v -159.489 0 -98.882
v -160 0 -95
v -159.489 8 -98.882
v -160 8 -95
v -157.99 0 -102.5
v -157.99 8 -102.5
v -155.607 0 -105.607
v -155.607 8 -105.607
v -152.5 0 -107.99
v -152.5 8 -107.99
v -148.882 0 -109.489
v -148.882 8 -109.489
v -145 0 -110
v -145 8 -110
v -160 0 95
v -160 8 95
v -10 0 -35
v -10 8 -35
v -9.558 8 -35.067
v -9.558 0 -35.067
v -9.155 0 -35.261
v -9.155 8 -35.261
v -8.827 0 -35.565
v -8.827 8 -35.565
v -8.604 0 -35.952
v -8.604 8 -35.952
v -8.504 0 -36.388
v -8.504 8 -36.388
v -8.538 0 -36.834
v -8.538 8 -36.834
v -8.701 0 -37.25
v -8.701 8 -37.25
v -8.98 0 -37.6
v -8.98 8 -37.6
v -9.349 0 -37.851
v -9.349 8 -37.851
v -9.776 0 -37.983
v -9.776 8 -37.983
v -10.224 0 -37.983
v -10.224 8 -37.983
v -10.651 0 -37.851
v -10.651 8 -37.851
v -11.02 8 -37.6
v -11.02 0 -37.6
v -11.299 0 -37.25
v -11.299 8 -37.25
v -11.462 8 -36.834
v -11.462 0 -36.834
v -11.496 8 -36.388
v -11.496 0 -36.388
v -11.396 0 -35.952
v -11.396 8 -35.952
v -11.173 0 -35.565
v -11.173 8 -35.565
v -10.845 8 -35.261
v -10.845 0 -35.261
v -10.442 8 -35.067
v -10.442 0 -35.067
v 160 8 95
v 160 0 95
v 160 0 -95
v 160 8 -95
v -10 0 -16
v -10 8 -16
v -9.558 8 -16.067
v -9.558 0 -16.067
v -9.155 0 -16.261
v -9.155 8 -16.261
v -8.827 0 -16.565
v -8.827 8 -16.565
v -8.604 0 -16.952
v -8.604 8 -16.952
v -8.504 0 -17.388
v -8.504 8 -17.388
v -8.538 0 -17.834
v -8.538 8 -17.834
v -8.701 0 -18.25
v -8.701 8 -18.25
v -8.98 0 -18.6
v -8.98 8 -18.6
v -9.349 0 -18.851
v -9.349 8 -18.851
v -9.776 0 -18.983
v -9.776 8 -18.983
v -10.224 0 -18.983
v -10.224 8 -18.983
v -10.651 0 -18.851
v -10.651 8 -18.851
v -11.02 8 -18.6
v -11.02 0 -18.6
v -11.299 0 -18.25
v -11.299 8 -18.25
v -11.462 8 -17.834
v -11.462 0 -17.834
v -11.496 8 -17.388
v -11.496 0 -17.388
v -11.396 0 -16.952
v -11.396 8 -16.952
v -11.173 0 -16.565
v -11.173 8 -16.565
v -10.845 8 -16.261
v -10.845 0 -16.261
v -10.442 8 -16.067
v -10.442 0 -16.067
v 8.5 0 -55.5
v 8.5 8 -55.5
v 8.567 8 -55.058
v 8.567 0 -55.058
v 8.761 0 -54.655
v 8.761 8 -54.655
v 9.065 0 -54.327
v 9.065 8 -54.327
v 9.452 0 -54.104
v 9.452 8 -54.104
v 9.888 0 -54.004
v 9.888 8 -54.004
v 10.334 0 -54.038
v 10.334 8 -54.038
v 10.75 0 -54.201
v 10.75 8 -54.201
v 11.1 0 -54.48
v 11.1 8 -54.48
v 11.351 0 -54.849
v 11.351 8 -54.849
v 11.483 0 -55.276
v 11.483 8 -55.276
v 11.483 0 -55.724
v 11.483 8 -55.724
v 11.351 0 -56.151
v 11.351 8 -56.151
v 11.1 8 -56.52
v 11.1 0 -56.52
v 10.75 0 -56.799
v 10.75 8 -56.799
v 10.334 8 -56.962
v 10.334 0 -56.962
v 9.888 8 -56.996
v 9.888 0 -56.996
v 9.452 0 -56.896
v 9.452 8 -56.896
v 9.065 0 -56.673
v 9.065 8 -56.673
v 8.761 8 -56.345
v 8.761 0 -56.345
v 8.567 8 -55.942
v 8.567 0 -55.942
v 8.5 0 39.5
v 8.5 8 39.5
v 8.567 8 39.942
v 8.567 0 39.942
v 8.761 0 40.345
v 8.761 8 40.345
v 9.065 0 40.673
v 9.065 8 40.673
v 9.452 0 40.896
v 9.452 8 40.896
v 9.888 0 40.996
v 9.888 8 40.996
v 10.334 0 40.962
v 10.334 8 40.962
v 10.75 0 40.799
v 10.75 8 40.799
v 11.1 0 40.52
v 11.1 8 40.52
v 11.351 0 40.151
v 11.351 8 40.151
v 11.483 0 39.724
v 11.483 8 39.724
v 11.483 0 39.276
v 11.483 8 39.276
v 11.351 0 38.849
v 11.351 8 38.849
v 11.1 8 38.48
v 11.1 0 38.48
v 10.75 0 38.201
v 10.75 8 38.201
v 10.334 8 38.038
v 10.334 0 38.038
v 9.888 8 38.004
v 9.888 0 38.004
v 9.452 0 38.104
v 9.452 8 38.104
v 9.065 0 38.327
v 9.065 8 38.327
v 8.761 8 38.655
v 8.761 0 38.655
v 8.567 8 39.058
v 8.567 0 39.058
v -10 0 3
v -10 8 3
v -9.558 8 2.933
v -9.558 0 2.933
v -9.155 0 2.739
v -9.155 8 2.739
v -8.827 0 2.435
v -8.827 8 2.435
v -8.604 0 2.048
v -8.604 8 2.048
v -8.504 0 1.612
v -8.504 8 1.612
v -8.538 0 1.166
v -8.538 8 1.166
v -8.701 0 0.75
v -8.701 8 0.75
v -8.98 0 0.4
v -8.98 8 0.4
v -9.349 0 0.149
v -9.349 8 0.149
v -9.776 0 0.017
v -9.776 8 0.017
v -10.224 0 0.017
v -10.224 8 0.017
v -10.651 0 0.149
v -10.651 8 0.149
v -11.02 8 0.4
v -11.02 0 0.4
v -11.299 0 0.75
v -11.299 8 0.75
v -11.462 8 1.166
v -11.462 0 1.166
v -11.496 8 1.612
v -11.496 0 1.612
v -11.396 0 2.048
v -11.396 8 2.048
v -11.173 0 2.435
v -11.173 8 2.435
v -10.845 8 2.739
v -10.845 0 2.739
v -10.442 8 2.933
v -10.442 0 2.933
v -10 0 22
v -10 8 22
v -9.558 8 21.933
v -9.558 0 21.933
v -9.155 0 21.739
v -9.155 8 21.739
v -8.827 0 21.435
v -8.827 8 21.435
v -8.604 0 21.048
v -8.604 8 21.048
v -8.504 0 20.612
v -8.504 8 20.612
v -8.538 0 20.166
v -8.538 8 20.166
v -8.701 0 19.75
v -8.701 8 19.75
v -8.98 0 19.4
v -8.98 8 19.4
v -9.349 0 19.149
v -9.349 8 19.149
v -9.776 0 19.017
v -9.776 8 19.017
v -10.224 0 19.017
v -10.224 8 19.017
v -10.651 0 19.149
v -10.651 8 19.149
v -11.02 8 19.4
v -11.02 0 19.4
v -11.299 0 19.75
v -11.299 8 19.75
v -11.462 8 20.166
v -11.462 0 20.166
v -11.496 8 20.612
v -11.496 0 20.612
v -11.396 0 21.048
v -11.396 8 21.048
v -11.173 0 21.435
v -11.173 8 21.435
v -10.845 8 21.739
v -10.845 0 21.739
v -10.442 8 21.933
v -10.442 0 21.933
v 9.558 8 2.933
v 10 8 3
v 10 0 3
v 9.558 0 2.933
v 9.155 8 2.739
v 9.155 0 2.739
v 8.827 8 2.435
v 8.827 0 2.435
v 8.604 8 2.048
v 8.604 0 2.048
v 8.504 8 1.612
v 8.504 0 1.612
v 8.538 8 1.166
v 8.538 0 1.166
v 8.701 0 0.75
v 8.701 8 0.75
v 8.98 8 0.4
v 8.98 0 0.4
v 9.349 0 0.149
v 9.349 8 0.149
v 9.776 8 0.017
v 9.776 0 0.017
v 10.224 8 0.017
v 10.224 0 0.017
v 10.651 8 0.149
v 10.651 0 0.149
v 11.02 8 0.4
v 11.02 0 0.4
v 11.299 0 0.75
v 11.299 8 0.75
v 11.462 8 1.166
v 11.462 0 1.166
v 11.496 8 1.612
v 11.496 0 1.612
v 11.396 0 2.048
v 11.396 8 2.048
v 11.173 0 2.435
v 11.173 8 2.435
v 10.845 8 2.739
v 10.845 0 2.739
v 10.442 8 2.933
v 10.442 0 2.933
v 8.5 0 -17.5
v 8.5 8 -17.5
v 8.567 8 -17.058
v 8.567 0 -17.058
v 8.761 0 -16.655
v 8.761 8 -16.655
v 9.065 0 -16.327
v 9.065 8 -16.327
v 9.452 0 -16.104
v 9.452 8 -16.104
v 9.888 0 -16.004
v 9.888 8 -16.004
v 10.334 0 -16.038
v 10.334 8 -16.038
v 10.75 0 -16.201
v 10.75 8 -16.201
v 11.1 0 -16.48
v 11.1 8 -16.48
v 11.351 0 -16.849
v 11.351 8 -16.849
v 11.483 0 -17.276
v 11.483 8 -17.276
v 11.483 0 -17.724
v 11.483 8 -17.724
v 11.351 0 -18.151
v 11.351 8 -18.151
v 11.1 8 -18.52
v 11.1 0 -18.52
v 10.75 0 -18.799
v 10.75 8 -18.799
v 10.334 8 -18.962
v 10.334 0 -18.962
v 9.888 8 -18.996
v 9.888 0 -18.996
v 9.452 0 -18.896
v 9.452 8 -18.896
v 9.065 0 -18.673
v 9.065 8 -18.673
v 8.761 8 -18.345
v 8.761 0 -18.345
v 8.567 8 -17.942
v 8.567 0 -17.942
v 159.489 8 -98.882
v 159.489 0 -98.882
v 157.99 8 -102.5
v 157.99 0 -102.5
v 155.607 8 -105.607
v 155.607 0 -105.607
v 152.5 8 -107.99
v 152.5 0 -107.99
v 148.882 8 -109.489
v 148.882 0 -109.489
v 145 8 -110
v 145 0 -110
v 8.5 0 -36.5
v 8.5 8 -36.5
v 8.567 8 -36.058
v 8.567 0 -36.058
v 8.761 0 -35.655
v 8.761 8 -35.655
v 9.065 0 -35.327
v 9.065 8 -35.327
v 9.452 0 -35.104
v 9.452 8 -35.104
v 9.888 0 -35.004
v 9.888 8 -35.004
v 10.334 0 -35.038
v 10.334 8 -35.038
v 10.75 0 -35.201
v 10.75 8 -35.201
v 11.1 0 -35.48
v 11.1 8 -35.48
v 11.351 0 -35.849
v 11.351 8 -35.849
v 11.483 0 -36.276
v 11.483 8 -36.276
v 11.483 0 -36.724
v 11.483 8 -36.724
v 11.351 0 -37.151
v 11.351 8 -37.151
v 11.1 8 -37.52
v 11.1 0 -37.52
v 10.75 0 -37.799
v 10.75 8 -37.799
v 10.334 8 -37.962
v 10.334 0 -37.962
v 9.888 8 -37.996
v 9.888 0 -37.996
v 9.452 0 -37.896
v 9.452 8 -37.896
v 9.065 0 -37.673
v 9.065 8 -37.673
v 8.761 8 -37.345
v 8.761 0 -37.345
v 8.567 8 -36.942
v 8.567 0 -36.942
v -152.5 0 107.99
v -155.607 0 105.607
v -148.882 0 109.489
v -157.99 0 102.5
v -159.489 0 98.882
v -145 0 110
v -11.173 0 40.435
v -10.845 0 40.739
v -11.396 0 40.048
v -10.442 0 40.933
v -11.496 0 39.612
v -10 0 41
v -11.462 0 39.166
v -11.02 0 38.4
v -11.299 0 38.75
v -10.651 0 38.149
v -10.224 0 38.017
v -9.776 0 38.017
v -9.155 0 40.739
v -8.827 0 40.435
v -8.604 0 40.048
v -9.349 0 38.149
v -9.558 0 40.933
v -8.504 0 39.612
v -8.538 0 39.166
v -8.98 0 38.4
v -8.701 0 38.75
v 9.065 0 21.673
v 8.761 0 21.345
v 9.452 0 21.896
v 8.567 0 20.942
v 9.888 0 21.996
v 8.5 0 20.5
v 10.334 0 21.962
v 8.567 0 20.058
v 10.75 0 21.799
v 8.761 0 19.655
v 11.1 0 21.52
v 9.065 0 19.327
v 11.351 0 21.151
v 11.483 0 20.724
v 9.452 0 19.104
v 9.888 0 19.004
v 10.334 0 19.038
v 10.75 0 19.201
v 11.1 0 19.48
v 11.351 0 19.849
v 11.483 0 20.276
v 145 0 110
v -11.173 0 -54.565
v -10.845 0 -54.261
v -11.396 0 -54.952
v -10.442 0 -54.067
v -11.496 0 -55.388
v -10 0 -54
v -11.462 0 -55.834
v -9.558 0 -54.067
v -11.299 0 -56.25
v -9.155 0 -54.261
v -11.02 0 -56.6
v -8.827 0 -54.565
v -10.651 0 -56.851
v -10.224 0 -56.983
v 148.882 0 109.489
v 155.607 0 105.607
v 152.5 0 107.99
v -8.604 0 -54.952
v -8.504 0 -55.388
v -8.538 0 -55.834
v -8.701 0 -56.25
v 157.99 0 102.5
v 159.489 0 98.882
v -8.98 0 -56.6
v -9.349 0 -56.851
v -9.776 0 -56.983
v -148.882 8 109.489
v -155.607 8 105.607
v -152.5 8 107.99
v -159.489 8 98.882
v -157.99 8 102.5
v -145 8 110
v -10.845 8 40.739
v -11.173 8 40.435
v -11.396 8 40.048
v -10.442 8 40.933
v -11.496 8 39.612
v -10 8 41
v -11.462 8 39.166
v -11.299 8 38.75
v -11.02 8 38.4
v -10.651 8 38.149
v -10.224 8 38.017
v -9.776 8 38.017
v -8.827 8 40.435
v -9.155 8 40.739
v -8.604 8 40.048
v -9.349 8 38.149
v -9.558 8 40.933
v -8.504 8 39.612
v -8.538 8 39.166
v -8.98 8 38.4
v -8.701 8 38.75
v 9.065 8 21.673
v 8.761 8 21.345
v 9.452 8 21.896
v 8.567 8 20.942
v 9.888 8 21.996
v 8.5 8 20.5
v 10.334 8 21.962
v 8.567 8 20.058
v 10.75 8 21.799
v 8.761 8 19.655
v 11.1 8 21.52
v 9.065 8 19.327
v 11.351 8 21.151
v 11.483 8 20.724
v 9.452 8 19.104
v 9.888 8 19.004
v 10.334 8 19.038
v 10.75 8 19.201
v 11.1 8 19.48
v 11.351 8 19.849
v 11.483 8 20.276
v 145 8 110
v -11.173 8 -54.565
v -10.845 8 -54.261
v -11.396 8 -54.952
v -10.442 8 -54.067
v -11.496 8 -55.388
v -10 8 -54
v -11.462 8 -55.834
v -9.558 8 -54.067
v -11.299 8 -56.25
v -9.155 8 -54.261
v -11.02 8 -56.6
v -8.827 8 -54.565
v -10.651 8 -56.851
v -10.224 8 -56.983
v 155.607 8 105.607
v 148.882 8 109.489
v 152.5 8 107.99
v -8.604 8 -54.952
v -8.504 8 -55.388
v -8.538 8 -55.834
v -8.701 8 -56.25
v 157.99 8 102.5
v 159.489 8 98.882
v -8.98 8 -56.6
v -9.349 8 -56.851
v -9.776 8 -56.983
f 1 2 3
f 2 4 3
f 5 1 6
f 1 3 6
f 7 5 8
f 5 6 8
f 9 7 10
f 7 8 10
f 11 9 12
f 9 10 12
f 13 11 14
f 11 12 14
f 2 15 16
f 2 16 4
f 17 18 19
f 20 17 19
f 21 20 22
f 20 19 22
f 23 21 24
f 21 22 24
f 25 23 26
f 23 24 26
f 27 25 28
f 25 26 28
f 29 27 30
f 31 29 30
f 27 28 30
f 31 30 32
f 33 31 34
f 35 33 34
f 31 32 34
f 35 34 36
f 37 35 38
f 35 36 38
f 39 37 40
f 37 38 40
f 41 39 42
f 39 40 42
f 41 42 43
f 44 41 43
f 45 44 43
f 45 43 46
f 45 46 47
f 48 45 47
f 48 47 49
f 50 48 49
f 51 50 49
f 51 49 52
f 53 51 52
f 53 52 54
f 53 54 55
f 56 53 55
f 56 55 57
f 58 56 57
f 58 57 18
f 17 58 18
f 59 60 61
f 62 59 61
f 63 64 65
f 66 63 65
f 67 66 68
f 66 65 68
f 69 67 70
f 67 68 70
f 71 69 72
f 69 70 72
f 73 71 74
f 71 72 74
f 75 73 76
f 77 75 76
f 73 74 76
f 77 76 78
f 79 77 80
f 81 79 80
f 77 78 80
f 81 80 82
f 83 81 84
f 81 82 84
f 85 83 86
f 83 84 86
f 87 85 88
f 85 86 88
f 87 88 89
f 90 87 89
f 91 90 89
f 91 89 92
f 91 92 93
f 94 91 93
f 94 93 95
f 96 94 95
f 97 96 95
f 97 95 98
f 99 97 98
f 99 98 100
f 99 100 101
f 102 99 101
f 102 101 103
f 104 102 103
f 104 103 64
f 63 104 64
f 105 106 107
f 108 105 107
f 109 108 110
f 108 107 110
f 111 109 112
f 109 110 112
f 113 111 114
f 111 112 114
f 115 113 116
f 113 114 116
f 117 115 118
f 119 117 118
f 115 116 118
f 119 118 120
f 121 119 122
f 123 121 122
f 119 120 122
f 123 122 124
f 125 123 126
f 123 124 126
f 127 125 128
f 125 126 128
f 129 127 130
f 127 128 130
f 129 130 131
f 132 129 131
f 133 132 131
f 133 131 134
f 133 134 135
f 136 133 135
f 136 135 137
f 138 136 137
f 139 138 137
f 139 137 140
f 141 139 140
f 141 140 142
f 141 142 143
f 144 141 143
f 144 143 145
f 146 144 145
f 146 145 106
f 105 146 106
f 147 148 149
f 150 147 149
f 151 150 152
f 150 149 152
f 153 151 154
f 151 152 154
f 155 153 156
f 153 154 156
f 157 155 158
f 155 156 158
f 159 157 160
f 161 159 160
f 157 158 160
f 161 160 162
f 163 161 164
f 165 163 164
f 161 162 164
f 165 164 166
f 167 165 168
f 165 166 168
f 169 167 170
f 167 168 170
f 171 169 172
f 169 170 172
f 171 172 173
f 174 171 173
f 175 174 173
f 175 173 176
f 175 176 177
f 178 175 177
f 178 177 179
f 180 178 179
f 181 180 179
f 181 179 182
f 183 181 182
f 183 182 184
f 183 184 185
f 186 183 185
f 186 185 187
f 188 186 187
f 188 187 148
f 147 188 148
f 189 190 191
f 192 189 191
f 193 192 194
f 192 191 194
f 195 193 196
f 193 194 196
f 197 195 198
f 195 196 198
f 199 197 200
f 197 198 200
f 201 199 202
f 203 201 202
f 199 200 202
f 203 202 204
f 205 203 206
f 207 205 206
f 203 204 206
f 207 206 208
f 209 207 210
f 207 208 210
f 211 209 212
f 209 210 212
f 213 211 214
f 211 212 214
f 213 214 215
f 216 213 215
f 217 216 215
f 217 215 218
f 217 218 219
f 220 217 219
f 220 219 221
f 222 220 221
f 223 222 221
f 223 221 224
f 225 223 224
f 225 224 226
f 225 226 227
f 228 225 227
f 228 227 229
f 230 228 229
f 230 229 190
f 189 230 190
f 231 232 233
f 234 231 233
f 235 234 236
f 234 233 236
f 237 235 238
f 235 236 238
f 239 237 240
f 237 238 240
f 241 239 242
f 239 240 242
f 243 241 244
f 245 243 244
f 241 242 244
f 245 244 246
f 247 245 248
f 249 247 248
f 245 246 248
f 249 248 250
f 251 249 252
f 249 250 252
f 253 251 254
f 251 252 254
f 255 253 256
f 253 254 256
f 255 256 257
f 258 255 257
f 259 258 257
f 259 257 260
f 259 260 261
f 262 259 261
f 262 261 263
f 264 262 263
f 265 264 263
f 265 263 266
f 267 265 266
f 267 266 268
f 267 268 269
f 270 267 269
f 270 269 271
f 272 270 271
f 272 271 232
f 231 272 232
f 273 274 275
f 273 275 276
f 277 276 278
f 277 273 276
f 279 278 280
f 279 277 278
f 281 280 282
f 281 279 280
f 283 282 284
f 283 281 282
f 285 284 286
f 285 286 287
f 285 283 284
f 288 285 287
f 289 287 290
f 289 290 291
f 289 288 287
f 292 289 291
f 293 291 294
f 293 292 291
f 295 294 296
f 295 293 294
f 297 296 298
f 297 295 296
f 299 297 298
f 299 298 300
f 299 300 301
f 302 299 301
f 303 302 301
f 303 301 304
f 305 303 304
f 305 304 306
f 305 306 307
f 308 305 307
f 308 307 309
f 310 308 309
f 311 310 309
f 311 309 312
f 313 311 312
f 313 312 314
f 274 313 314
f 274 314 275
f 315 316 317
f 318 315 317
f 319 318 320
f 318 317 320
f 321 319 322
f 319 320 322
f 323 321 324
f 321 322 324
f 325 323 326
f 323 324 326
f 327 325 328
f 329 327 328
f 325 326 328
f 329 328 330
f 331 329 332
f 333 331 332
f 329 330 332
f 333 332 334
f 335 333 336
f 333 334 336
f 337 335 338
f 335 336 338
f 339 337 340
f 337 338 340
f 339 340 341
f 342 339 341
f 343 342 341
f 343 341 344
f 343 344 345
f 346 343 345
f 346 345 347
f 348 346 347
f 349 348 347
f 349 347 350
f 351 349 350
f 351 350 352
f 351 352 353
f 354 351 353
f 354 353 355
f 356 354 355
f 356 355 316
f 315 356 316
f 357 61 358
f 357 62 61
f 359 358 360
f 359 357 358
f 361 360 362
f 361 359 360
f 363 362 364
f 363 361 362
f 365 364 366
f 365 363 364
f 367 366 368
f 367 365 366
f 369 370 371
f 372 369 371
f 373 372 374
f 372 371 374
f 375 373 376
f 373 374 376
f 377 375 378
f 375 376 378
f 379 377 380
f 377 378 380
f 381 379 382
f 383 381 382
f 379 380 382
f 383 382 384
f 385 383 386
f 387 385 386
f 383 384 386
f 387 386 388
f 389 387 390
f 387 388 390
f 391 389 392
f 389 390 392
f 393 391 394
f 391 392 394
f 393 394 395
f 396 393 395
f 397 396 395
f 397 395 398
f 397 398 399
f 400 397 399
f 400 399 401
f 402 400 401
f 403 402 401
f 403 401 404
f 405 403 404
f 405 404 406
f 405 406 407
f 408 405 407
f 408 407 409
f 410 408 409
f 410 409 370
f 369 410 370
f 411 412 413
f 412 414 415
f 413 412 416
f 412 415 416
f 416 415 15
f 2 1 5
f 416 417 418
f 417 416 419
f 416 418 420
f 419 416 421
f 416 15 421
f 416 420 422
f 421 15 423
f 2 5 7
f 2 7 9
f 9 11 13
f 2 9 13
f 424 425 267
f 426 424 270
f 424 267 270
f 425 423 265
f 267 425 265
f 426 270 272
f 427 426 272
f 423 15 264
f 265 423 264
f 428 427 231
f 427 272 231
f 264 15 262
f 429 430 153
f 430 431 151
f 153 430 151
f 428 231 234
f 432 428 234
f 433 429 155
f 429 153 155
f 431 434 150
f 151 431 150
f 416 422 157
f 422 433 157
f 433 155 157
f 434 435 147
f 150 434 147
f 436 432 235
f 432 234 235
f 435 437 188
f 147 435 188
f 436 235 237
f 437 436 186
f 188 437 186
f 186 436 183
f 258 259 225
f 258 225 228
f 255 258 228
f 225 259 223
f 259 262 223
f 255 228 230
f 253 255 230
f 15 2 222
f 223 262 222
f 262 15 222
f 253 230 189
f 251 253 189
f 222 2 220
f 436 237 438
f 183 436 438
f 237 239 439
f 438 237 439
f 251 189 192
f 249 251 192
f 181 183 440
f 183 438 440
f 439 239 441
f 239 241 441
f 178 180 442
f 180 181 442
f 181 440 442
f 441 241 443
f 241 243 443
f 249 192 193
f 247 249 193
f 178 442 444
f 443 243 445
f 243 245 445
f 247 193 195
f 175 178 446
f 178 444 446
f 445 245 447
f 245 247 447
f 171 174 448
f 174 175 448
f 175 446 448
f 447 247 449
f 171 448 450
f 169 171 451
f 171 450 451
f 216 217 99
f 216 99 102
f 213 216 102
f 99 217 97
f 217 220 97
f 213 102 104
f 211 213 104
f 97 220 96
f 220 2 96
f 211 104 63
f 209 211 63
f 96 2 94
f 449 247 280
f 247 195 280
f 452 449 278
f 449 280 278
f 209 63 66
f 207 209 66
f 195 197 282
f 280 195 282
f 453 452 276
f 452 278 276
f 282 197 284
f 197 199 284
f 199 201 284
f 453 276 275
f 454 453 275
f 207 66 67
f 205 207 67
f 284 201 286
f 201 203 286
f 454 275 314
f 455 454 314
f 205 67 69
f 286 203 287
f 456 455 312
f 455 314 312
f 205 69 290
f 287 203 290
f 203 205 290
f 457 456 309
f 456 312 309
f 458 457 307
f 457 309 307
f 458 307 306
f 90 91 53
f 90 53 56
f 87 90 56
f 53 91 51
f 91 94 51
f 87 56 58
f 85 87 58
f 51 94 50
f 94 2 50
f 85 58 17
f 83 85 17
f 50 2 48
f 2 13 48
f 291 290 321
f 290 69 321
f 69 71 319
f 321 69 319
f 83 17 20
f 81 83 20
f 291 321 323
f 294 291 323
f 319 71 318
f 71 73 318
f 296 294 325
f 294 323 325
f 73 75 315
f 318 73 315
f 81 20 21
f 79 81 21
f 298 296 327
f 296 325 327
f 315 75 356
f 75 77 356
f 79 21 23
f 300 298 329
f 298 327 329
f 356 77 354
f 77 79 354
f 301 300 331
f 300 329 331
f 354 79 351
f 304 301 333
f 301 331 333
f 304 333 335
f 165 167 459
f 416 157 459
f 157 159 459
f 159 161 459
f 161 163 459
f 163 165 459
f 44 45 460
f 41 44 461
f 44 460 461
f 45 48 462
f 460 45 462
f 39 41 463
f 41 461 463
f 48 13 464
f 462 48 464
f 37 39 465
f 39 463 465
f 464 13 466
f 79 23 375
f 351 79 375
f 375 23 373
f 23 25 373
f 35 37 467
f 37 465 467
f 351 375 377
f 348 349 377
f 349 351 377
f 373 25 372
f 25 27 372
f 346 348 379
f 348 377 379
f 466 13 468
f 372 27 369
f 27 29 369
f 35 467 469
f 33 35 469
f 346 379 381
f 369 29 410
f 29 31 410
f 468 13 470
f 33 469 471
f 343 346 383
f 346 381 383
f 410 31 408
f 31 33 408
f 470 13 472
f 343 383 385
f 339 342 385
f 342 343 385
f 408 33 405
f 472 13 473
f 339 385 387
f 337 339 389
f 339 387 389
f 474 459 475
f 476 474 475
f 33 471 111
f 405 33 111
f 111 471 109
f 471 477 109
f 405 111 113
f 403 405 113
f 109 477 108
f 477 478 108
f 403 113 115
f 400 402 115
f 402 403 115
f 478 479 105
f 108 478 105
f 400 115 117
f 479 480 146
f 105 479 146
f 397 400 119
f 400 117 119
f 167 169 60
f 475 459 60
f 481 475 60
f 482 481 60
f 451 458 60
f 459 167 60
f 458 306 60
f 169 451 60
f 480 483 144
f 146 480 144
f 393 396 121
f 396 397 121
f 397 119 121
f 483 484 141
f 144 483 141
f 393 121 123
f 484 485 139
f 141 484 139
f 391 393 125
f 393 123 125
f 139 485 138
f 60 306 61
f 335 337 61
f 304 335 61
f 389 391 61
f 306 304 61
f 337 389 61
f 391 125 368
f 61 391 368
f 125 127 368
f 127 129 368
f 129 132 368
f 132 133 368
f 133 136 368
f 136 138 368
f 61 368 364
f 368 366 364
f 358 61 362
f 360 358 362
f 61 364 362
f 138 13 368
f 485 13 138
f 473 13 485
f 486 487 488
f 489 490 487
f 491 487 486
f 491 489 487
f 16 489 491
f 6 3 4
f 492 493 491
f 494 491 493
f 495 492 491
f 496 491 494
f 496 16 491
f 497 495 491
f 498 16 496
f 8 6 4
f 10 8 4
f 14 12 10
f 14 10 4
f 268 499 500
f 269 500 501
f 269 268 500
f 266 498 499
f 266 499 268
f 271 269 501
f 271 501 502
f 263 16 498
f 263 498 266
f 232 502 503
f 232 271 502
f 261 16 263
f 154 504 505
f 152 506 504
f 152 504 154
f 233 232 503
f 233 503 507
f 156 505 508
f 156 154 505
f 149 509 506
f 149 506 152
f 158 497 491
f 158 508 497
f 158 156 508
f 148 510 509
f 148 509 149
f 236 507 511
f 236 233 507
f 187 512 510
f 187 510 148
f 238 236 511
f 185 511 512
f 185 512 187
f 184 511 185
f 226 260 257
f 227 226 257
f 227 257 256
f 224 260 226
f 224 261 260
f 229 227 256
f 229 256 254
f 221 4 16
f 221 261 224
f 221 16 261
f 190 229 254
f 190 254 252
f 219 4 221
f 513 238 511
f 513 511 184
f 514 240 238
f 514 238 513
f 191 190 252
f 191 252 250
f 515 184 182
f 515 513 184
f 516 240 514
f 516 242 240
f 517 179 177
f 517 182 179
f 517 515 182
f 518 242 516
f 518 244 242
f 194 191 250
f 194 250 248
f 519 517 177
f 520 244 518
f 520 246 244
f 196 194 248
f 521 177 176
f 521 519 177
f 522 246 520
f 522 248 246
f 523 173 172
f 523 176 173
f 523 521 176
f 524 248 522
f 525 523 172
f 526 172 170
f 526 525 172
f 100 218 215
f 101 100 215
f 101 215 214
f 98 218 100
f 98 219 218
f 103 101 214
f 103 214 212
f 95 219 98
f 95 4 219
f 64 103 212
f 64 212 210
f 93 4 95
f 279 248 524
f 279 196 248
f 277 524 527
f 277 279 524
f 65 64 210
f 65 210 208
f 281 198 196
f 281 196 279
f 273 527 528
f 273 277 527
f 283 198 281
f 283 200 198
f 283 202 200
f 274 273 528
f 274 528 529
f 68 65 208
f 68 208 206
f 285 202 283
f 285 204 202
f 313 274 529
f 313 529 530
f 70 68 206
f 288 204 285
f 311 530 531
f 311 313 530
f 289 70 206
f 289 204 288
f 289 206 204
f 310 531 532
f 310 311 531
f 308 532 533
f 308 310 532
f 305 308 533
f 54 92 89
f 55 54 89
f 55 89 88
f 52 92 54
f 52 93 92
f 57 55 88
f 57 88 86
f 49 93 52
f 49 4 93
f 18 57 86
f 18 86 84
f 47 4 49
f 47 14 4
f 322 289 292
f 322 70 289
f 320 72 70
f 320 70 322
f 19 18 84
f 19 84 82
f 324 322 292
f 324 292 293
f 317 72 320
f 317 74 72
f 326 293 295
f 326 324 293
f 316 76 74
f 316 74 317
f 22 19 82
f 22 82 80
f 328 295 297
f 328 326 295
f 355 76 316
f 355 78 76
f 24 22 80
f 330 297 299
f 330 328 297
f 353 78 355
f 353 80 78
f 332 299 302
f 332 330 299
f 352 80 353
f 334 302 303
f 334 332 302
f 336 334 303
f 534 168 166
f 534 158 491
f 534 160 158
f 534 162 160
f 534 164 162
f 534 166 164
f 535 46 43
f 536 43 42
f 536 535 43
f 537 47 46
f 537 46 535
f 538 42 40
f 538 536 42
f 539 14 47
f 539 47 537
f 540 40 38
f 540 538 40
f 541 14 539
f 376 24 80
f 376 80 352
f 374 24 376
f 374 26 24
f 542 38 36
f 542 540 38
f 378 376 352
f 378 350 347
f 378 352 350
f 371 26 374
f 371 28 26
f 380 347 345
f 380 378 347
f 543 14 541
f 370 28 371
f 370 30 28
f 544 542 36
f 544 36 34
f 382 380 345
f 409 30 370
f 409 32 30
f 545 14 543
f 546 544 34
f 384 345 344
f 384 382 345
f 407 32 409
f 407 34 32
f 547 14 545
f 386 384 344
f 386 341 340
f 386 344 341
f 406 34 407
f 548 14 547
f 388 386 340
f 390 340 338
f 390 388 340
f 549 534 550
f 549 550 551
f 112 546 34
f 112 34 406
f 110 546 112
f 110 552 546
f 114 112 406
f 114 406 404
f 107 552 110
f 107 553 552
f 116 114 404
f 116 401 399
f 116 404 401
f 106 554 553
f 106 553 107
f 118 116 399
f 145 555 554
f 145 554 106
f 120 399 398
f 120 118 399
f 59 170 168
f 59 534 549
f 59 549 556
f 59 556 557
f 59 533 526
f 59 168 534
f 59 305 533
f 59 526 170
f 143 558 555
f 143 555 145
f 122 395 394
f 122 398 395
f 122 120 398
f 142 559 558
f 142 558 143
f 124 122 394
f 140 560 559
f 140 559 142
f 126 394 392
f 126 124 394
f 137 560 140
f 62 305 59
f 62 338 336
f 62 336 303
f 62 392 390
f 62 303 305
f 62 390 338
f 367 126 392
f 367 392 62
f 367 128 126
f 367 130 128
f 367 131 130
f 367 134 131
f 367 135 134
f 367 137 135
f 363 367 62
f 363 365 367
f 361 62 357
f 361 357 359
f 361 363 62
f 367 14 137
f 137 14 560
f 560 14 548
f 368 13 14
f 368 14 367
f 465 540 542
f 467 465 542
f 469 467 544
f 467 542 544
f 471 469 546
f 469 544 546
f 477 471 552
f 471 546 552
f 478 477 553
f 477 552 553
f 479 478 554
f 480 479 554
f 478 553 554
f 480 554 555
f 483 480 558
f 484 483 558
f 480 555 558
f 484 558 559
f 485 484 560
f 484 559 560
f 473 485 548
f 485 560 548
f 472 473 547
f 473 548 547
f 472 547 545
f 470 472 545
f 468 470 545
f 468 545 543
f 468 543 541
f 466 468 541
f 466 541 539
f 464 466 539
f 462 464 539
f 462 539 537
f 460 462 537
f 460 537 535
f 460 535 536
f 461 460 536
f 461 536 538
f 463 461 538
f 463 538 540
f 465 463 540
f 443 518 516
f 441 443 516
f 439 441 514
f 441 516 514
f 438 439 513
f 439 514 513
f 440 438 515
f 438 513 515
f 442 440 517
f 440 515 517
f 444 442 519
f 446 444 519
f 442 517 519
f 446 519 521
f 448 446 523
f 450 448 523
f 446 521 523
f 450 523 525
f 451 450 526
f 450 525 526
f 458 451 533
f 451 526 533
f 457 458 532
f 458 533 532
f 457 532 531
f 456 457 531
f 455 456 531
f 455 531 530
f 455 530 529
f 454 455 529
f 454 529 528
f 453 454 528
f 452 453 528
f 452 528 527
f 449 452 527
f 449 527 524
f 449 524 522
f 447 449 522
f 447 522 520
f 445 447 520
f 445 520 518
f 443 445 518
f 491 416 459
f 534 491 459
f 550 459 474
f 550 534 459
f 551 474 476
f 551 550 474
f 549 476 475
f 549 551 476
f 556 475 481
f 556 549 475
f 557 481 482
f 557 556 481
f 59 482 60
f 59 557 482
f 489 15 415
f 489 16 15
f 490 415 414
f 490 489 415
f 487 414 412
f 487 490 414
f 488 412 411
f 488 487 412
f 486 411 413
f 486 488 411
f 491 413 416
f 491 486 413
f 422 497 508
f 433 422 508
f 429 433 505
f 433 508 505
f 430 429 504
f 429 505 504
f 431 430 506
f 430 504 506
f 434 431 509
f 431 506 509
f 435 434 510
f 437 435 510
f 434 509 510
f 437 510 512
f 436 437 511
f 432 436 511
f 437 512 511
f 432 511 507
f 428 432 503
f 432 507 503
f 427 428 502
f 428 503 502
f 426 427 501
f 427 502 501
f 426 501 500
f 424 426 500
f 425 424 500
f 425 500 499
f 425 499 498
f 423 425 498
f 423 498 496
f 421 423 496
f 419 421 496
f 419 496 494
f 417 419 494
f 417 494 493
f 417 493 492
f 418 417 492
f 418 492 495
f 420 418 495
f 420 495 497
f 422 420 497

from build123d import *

# Parameters (mm, degrees)
SKETCH1_W               = 320
SKETCH1_H               = 220
BOSS_EXTRUDE1_DEPTH     = 8
FILLET1_R               = 15
CUT_EXTRUDE2_REACH      = 196.33
SKETCH3_R               = 1.5
LPATTERN2_COUNT         = 4
LPATTERN2_PITCH         = 19
LPATTERN2_COL_COUNT     = 3
LPATTERN2_COL_PITCH     = 19
MIRROR2_COPY_1_REACH    = 196.33
MIRROR2_COPY_1_SKETCH_R = 1.5
MIRROR2_COPY_2_REACH    = 196.33
MIRROR2_COPY_2_SKETCH_R = 1.5
MIRROR2_COPY_3_REACH    = 196.33
MIRROR2_COPY_3_SKETCH_R = 1.5
MIRROR2_COPY_4_REACH    = 196.33
MIRROR2_COPY_4_SKETCH_R = 1.5
MIRROR2_COPY_5_REACH    = 196.33
MIRROR2_COPY_5_SKETCH_R = 1.5


with BuildPart() as part:
    # Sketch1 → Boss-Extrude1 (new body)
    with BuildSketch(Plane(origin=(0, 0, 0), x_dir=(1, 0, 0), z_dir=(0, 1, 0))):
        Rectangle(SKETCH1_W, SKETCH1_H)
    extrude(amount=BOSS_EXTRUDE1_DEPTH)

    # Fillet1
    fillet1_edges = [part.edges().sort_by_distance(p)[0] for p in [
        (-160, 4, -110),
        (160, 4, -110),
        (160, 4, 110),
        (-160, 4, 110),
    ]]
    fillet(fillet1_edges, radius=FILLET1_R)

    # Sketch3 → Cut-Extrude2 (cut, up to next)
    with BuildSketch(Plane(origin=(0, 8, 0), x_dir=(1, 0, 0), z_dir=(0, 1, 0)), mode=Mode.PRIVATE) as cut_extrude2_sk1:
        with Locations(Location((-10, -1.5, 0), (0, 0, 270))):
            Circle(SKETCH3_R)
    cut_extrude2_tool1 = extrude(cut_extrude2_sk1.sketch, amount=-CUT_EXTRUDE2_REACH, mode=Mode.PRIVATE) & part.part
    cut_extrude2 = cut_extrude2_tool1.solids().sort_by_distance((-10, 8, 1.5))[0]
    add(cut_extrude2, mode=Mode.SUBTRACT)

    # LPattern2: Cut-Extrude2 ×4
    with Locations(*[(0, 0, -i * LPATTERN2_PITCH) for i in range(1, LPATTERN2_COUNT)]):
        add(cut_extrude2, mode=Mode.SUBTRACT)

    # LPattern2 col: Cut-Extrude2 ×3
    with Locations(*[(0, 0, i * LPATTERN2_COL_PITCH) for i in range(1, LPATTERN2_COL_COUNT)]):
        add(cut_extrude2, mode=Mode.SUBTRACT)

    # Mirror2: Cut-Extrude2 across plane
    add(cut_extrude2.mirror(Plane(origin=(0, 0, 0), x_dir=(0, 0, 1), z_dir=(1, 0, 0))), mode=Mode.SUBTRACT)

    # Mirror2 copy 1 sketch → Mirror2 copy 1 (cut, up to next)
    with BuildSketch(Plane(origin=(0, 8, -19), x_dir=(-1, 0, 0), z_dir=(0, 1, 0)), mode=Mode.PRIVATE) as mirror2_copy_1_sk1:
        with Locations((-10, 1.5)):
            Circle(MIRROR2_COPY_1_SKETCH_R)
    mirror2_copy_1_tool1 = extrude(mirror2_copy_1_sk1.sketch, amount=-MIRROR2_COPY_1_REACH, mode=Mode.PRIVATE) & part.part
    add(mirror2_copy_1_tool1.solids().sort_by_distance((10, 8, -17.5))[0], mode=Mode.SUBTRACT)

    # Mirror2 copy 2 sketch → Mirror2 copy 2 (cut, up to next)
    with BuildSketch(Plane(origin=(0, 8, -38), x_dir=(-1, 0, 0), z_dir=(0, 1, 0)), mode=Mode.PRIVATE) as mirror2_copy_2_sk1:
        with Locations((-10, 1.5)):
            Circle(MIRROR2_COPY_2_SKETCH_R)
    mirror2_copy_2_tool1 = extrude(mirror2_copy_2_sk1.sketch, amount=-MIRROR2_COPY_2_REACH, mode=Mode.PRIVATE) & part.part
    add(mirror2_copy_2_tool1.solids().sort_by_distance((10, 8, -36.5))[0], mode=Mode.SUBTRACT)

    # Mirror2 copy 3 sketch → Mirror2 copy 3 (cut, up to next)
    with BuildSketch(Plane(origin=(0, 8, -57), x_dir=(-1, 0, 0), z_dir=(0, 1, 0)), mode=Mode.PRIVATE) as mirror2_copy_3_sk1:
        with Locations((-10, 1.5)):
            Circle(MIRROR2_COPY_3_SKETCH_R)
    mirror2_copy_3_tool1 = extrude(mirror2_copy_3_sk1.sketch, amount=-MIRROR2_COPY_3_REACH, mode=Mode.PRIVATE) & part.part
    add(mirror2_copy_3_tool1.solids().sort_by_distance((10, 8, -55.5))[0], mode=Mode.SUBTRACT)

    # Mirror2 copy 4 sketch → Mirror2 copy 4 (cut, up to next)
    with BuildSketch(Plane(origin=(0, 8, 19), x_dir=(-1, 0, 0), z_dir=(0, 1, 0)), mode=Mode.PRIVATE) as mirror2_copy_4_sk1:
        with Locations((-10, 1.5)):
            Circle(MIRROR2_COPY_4_SKETCH_R)
    mirror2_copy_4_tool1 = extrude(mirror2_copy_4_sk1.sketch, amount=-MIRROR2_COPY_4_REACH, mode=Mode.PRIVATE) & part.part
    add(mirror2_copy_4_tool1.solids().sort_by_distance((10, 8, 20.5))[0], mode=Mode.SUBTRACT)

    # Mirror2 copy 5 sketch → Mirror2 copy 5 (cut, up to next)
    with BuildSketch(Plane(origin=(0, 8, 38), x_dir=(-1, 0, 0), z_dir=(0, 1, 0)), mode=Mode.PRIVATE) as mirror2_copy_5_sk1:
        with Locations((-10, 1.5)):
            Circle(MIRROR2_COPY_5_SKETCH_R)
    mirror2_copy_5_tool1 = extrude(mirror2_copy_5_sk1.sketch, amount=-MIRROR2_COPY_5_REACH, mode=Mode.PRIVATE) & part.part
    add(mirror2_copy_5_tool1.solids().sort_by_distance((10, 8, 39.5))[0], mode=Mode.SUBTRACT)


solid = part.part
